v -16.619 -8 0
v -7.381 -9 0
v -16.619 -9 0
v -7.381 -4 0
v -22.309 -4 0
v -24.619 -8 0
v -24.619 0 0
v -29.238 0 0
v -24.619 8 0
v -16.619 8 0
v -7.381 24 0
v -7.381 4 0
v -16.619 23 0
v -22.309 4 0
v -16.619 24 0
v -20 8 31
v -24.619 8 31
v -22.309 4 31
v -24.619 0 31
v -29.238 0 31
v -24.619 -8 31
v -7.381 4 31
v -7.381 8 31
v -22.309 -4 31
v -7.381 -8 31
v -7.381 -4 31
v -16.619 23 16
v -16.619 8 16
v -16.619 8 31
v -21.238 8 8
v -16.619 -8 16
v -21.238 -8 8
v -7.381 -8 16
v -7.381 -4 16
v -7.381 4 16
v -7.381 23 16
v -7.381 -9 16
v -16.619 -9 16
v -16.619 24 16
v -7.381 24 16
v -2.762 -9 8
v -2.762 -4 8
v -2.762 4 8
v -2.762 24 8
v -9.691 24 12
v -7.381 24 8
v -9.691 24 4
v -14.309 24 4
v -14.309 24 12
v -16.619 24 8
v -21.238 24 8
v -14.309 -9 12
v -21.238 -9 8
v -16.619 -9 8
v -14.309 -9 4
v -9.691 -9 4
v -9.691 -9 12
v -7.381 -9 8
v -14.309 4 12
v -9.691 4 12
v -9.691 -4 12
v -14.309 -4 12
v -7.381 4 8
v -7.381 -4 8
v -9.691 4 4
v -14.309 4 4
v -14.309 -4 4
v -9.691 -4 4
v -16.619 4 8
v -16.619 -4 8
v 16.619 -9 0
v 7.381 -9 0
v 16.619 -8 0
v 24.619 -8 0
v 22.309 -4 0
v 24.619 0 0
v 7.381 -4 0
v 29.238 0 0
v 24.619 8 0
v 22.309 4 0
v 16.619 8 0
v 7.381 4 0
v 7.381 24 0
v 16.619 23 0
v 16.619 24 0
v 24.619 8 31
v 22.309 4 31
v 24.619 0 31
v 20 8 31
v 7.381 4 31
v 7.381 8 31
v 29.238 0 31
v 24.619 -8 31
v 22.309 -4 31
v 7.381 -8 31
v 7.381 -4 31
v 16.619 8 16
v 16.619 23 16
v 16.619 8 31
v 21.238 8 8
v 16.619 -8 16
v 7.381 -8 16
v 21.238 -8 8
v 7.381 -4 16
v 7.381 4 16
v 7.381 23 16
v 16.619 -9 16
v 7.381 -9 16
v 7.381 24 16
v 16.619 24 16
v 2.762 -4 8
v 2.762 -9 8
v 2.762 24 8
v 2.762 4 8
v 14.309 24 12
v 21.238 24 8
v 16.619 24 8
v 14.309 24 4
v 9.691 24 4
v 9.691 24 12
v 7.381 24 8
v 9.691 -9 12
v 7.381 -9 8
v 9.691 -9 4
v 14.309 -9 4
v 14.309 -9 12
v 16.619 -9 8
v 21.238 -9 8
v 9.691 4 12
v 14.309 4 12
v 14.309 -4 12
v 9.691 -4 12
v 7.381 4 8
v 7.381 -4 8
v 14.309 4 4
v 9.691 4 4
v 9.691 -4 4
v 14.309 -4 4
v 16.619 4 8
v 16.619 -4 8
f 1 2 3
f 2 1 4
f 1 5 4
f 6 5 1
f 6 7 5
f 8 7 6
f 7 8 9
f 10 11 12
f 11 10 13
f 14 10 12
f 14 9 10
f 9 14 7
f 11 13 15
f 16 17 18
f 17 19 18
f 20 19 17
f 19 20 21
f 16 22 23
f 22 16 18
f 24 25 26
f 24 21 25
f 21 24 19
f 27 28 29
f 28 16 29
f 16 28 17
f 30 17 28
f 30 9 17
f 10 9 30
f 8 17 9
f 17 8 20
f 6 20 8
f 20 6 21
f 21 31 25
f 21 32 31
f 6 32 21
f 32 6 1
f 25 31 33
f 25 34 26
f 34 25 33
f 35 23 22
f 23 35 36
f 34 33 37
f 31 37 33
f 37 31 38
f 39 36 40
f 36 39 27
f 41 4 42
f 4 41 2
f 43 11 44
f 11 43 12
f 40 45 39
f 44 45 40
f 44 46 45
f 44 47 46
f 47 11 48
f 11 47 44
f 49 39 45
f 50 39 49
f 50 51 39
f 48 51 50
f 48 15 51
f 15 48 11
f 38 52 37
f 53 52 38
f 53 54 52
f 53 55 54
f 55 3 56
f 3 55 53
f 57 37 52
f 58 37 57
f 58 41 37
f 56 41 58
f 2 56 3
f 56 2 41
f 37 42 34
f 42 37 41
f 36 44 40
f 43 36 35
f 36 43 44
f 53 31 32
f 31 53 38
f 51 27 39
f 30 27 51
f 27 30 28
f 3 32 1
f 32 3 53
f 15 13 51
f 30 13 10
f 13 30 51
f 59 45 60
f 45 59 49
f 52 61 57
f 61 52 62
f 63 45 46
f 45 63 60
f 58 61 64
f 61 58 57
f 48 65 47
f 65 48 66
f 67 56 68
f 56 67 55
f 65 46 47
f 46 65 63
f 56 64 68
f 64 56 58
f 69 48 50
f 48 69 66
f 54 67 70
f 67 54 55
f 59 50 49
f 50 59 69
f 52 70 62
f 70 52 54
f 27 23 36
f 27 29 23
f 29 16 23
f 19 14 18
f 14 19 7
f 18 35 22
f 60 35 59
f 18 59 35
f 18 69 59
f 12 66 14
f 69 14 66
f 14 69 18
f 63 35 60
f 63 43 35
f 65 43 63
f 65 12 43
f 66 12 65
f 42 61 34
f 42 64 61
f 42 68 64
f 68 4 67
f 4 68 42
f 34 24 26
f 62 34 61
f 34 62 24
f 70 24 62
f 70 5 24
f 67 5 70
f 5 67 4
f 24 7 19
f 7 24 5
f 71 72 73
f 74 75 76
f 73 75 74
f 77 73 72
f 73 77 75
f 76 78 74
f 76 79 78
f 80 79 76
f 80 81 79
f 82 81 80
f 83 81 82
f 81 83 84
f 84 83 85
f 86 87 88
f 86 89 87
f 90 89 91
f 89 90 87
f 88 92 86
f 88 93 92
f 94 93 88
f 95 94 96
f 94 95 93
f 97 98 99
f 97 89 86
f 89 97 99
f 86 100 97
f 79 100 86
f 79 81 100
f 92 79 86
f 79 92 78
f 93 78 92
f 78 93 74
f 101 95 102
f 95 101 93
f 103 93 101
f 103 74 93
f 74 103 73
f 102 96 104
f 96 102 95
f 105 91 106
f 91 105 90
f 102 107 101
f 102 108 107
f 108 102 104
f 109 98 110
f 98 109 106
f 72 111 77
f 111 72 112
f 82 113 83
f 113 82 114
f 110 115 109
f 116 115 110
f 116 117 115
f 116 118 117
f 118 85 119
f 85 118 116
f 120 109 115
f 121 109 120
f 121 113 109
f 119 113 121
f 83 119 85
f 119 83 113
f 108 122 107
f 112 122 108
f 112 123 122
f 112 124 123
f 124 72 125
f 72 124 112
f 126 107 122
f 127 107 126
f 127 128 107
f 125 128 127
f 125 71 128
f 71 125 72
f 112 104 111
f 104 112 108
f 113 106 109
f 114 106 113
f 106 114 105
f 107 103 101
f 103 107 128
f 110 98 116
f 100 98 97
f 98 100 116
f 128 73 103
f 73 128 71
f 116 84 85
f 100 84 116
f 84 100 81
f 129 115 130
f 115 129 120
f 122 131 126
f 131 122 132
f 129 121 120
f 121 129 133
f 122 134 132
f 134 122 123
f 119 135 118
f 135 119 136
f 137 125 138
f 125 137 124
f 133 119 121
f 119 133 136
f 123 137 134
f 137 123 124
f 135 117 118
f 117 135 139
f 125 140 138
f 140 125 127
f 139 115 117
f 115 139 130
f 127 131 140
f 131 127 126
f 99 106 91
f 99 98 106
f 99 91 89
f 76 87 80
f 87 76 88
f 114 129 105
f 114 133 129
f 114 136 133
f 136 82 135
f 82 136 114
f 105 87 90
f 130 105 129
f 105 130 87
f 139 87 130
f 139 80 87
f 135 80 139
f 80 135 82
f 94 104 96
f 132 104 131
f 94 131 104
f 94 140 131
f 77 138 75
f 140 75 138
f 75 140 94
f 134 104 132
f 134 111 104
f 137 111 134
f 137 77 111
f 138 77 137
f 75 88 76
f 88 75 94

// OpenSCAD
// file: settings.scad
rod_size = 8;
rod_nut_size = 15; //12 for M6, 15 for M8
bearing_size = 15.5; //12.5 for LM6UU, 15.5 for LM8UU,LM8SUU
bearing_length = 24.5; //19.5 for LM6UU, 17.5 for LM8SUU, 24.5 for LM8UU
yz_motor_distance = 25;
motor_screw_spacing = 26; //26 for NEMA14, 31 for NEMA17
motor_casing = 38; //38 for NEMA14, 45 for NEMA17
end_height = 40; //measure the height of your motor casing and add 4mm. Suggestion: 40 for NEMA14, 55 for NEMA17
bed_mount_height = 16;
//x_rod_spacing = motor_screw_spacing + 3 + rod_size;
x_rod_spacing = 30;
x_carriage_width = 70;
carriage_extruder_offset = 5;
pulley_size = 20;
idler_pulley_width = 10;
gusset_size = 15;
m3_size = 3;
m3_nut_size = 6;
m4_size = 4;
motor_shaft_size = 5;

// ratio for converting diameter to apothem
da6 = 1 / cos(180 / 6) / 2;
da8 = 1 / cos(180 / 8) / 2;
// main file
include <settings.scad>;

!for(side = [0, 1]) mirror([side, 0, 0]) translate([-rod_size * 2.5, 0, 0]) z_top_clamp();

module z_top_clamp() difference() {
	union() {
		linear_extrude(height = rod_size * 2 + gusset_size, convexity = 5) difference() {
			union() {
				circle(r = rod_size * da6 * 2, $fn = 6);
				translate([0, -rod_size, 0]) square([rod_size * (1 + da6), rod_size * 2]);
				translate([rod_size - rod_size * da6, rod_size / 2, rod_size]) square([rod_size * da6 * 2, rod_size / 2 + gusset_size]);
			}
		}
		translate([rod_size, -rod_size - 1, rod_size]) rotate([-90, 0, 0]) cylinder(r = rod_size / cos(180 / 6), h = rod_size * 2 + gusset_size + 2, $fn = 6);
	}
	translate([rod_size, -rod_size - 2, rod_size]) rotate([-90, 0, 0]) cylinder(r = rod_size * da6, h = gusset_size + rod_size * 2 + 4, $fn = 6);
	translate([rod_size, rod_size + gusset_size, rod_size * 2 + gusset_size]) rotate([45, 0, 0]) cube([rod_size * 2, gusset_size * sqrt(2), gusset_size * sqrt(2)], center = true);
	translate([0, 0, -1]) linear_extrude(height = rod_size * 2 + gusset_size + 2, convexity = 5) {
		circle(r = rod_size * da6, $fn = 6);
		%translate([rod_size, -10, rod_size * da6 * 2]) rotate([-90, 0, 0]) cylinder(r = rod_size * da6, h = 160, $fn = 6);
		translate([0, -rod_size / 2, 0]) square([gusset_size + rod_size * 2 + 1, rod_size]);
	}
}
